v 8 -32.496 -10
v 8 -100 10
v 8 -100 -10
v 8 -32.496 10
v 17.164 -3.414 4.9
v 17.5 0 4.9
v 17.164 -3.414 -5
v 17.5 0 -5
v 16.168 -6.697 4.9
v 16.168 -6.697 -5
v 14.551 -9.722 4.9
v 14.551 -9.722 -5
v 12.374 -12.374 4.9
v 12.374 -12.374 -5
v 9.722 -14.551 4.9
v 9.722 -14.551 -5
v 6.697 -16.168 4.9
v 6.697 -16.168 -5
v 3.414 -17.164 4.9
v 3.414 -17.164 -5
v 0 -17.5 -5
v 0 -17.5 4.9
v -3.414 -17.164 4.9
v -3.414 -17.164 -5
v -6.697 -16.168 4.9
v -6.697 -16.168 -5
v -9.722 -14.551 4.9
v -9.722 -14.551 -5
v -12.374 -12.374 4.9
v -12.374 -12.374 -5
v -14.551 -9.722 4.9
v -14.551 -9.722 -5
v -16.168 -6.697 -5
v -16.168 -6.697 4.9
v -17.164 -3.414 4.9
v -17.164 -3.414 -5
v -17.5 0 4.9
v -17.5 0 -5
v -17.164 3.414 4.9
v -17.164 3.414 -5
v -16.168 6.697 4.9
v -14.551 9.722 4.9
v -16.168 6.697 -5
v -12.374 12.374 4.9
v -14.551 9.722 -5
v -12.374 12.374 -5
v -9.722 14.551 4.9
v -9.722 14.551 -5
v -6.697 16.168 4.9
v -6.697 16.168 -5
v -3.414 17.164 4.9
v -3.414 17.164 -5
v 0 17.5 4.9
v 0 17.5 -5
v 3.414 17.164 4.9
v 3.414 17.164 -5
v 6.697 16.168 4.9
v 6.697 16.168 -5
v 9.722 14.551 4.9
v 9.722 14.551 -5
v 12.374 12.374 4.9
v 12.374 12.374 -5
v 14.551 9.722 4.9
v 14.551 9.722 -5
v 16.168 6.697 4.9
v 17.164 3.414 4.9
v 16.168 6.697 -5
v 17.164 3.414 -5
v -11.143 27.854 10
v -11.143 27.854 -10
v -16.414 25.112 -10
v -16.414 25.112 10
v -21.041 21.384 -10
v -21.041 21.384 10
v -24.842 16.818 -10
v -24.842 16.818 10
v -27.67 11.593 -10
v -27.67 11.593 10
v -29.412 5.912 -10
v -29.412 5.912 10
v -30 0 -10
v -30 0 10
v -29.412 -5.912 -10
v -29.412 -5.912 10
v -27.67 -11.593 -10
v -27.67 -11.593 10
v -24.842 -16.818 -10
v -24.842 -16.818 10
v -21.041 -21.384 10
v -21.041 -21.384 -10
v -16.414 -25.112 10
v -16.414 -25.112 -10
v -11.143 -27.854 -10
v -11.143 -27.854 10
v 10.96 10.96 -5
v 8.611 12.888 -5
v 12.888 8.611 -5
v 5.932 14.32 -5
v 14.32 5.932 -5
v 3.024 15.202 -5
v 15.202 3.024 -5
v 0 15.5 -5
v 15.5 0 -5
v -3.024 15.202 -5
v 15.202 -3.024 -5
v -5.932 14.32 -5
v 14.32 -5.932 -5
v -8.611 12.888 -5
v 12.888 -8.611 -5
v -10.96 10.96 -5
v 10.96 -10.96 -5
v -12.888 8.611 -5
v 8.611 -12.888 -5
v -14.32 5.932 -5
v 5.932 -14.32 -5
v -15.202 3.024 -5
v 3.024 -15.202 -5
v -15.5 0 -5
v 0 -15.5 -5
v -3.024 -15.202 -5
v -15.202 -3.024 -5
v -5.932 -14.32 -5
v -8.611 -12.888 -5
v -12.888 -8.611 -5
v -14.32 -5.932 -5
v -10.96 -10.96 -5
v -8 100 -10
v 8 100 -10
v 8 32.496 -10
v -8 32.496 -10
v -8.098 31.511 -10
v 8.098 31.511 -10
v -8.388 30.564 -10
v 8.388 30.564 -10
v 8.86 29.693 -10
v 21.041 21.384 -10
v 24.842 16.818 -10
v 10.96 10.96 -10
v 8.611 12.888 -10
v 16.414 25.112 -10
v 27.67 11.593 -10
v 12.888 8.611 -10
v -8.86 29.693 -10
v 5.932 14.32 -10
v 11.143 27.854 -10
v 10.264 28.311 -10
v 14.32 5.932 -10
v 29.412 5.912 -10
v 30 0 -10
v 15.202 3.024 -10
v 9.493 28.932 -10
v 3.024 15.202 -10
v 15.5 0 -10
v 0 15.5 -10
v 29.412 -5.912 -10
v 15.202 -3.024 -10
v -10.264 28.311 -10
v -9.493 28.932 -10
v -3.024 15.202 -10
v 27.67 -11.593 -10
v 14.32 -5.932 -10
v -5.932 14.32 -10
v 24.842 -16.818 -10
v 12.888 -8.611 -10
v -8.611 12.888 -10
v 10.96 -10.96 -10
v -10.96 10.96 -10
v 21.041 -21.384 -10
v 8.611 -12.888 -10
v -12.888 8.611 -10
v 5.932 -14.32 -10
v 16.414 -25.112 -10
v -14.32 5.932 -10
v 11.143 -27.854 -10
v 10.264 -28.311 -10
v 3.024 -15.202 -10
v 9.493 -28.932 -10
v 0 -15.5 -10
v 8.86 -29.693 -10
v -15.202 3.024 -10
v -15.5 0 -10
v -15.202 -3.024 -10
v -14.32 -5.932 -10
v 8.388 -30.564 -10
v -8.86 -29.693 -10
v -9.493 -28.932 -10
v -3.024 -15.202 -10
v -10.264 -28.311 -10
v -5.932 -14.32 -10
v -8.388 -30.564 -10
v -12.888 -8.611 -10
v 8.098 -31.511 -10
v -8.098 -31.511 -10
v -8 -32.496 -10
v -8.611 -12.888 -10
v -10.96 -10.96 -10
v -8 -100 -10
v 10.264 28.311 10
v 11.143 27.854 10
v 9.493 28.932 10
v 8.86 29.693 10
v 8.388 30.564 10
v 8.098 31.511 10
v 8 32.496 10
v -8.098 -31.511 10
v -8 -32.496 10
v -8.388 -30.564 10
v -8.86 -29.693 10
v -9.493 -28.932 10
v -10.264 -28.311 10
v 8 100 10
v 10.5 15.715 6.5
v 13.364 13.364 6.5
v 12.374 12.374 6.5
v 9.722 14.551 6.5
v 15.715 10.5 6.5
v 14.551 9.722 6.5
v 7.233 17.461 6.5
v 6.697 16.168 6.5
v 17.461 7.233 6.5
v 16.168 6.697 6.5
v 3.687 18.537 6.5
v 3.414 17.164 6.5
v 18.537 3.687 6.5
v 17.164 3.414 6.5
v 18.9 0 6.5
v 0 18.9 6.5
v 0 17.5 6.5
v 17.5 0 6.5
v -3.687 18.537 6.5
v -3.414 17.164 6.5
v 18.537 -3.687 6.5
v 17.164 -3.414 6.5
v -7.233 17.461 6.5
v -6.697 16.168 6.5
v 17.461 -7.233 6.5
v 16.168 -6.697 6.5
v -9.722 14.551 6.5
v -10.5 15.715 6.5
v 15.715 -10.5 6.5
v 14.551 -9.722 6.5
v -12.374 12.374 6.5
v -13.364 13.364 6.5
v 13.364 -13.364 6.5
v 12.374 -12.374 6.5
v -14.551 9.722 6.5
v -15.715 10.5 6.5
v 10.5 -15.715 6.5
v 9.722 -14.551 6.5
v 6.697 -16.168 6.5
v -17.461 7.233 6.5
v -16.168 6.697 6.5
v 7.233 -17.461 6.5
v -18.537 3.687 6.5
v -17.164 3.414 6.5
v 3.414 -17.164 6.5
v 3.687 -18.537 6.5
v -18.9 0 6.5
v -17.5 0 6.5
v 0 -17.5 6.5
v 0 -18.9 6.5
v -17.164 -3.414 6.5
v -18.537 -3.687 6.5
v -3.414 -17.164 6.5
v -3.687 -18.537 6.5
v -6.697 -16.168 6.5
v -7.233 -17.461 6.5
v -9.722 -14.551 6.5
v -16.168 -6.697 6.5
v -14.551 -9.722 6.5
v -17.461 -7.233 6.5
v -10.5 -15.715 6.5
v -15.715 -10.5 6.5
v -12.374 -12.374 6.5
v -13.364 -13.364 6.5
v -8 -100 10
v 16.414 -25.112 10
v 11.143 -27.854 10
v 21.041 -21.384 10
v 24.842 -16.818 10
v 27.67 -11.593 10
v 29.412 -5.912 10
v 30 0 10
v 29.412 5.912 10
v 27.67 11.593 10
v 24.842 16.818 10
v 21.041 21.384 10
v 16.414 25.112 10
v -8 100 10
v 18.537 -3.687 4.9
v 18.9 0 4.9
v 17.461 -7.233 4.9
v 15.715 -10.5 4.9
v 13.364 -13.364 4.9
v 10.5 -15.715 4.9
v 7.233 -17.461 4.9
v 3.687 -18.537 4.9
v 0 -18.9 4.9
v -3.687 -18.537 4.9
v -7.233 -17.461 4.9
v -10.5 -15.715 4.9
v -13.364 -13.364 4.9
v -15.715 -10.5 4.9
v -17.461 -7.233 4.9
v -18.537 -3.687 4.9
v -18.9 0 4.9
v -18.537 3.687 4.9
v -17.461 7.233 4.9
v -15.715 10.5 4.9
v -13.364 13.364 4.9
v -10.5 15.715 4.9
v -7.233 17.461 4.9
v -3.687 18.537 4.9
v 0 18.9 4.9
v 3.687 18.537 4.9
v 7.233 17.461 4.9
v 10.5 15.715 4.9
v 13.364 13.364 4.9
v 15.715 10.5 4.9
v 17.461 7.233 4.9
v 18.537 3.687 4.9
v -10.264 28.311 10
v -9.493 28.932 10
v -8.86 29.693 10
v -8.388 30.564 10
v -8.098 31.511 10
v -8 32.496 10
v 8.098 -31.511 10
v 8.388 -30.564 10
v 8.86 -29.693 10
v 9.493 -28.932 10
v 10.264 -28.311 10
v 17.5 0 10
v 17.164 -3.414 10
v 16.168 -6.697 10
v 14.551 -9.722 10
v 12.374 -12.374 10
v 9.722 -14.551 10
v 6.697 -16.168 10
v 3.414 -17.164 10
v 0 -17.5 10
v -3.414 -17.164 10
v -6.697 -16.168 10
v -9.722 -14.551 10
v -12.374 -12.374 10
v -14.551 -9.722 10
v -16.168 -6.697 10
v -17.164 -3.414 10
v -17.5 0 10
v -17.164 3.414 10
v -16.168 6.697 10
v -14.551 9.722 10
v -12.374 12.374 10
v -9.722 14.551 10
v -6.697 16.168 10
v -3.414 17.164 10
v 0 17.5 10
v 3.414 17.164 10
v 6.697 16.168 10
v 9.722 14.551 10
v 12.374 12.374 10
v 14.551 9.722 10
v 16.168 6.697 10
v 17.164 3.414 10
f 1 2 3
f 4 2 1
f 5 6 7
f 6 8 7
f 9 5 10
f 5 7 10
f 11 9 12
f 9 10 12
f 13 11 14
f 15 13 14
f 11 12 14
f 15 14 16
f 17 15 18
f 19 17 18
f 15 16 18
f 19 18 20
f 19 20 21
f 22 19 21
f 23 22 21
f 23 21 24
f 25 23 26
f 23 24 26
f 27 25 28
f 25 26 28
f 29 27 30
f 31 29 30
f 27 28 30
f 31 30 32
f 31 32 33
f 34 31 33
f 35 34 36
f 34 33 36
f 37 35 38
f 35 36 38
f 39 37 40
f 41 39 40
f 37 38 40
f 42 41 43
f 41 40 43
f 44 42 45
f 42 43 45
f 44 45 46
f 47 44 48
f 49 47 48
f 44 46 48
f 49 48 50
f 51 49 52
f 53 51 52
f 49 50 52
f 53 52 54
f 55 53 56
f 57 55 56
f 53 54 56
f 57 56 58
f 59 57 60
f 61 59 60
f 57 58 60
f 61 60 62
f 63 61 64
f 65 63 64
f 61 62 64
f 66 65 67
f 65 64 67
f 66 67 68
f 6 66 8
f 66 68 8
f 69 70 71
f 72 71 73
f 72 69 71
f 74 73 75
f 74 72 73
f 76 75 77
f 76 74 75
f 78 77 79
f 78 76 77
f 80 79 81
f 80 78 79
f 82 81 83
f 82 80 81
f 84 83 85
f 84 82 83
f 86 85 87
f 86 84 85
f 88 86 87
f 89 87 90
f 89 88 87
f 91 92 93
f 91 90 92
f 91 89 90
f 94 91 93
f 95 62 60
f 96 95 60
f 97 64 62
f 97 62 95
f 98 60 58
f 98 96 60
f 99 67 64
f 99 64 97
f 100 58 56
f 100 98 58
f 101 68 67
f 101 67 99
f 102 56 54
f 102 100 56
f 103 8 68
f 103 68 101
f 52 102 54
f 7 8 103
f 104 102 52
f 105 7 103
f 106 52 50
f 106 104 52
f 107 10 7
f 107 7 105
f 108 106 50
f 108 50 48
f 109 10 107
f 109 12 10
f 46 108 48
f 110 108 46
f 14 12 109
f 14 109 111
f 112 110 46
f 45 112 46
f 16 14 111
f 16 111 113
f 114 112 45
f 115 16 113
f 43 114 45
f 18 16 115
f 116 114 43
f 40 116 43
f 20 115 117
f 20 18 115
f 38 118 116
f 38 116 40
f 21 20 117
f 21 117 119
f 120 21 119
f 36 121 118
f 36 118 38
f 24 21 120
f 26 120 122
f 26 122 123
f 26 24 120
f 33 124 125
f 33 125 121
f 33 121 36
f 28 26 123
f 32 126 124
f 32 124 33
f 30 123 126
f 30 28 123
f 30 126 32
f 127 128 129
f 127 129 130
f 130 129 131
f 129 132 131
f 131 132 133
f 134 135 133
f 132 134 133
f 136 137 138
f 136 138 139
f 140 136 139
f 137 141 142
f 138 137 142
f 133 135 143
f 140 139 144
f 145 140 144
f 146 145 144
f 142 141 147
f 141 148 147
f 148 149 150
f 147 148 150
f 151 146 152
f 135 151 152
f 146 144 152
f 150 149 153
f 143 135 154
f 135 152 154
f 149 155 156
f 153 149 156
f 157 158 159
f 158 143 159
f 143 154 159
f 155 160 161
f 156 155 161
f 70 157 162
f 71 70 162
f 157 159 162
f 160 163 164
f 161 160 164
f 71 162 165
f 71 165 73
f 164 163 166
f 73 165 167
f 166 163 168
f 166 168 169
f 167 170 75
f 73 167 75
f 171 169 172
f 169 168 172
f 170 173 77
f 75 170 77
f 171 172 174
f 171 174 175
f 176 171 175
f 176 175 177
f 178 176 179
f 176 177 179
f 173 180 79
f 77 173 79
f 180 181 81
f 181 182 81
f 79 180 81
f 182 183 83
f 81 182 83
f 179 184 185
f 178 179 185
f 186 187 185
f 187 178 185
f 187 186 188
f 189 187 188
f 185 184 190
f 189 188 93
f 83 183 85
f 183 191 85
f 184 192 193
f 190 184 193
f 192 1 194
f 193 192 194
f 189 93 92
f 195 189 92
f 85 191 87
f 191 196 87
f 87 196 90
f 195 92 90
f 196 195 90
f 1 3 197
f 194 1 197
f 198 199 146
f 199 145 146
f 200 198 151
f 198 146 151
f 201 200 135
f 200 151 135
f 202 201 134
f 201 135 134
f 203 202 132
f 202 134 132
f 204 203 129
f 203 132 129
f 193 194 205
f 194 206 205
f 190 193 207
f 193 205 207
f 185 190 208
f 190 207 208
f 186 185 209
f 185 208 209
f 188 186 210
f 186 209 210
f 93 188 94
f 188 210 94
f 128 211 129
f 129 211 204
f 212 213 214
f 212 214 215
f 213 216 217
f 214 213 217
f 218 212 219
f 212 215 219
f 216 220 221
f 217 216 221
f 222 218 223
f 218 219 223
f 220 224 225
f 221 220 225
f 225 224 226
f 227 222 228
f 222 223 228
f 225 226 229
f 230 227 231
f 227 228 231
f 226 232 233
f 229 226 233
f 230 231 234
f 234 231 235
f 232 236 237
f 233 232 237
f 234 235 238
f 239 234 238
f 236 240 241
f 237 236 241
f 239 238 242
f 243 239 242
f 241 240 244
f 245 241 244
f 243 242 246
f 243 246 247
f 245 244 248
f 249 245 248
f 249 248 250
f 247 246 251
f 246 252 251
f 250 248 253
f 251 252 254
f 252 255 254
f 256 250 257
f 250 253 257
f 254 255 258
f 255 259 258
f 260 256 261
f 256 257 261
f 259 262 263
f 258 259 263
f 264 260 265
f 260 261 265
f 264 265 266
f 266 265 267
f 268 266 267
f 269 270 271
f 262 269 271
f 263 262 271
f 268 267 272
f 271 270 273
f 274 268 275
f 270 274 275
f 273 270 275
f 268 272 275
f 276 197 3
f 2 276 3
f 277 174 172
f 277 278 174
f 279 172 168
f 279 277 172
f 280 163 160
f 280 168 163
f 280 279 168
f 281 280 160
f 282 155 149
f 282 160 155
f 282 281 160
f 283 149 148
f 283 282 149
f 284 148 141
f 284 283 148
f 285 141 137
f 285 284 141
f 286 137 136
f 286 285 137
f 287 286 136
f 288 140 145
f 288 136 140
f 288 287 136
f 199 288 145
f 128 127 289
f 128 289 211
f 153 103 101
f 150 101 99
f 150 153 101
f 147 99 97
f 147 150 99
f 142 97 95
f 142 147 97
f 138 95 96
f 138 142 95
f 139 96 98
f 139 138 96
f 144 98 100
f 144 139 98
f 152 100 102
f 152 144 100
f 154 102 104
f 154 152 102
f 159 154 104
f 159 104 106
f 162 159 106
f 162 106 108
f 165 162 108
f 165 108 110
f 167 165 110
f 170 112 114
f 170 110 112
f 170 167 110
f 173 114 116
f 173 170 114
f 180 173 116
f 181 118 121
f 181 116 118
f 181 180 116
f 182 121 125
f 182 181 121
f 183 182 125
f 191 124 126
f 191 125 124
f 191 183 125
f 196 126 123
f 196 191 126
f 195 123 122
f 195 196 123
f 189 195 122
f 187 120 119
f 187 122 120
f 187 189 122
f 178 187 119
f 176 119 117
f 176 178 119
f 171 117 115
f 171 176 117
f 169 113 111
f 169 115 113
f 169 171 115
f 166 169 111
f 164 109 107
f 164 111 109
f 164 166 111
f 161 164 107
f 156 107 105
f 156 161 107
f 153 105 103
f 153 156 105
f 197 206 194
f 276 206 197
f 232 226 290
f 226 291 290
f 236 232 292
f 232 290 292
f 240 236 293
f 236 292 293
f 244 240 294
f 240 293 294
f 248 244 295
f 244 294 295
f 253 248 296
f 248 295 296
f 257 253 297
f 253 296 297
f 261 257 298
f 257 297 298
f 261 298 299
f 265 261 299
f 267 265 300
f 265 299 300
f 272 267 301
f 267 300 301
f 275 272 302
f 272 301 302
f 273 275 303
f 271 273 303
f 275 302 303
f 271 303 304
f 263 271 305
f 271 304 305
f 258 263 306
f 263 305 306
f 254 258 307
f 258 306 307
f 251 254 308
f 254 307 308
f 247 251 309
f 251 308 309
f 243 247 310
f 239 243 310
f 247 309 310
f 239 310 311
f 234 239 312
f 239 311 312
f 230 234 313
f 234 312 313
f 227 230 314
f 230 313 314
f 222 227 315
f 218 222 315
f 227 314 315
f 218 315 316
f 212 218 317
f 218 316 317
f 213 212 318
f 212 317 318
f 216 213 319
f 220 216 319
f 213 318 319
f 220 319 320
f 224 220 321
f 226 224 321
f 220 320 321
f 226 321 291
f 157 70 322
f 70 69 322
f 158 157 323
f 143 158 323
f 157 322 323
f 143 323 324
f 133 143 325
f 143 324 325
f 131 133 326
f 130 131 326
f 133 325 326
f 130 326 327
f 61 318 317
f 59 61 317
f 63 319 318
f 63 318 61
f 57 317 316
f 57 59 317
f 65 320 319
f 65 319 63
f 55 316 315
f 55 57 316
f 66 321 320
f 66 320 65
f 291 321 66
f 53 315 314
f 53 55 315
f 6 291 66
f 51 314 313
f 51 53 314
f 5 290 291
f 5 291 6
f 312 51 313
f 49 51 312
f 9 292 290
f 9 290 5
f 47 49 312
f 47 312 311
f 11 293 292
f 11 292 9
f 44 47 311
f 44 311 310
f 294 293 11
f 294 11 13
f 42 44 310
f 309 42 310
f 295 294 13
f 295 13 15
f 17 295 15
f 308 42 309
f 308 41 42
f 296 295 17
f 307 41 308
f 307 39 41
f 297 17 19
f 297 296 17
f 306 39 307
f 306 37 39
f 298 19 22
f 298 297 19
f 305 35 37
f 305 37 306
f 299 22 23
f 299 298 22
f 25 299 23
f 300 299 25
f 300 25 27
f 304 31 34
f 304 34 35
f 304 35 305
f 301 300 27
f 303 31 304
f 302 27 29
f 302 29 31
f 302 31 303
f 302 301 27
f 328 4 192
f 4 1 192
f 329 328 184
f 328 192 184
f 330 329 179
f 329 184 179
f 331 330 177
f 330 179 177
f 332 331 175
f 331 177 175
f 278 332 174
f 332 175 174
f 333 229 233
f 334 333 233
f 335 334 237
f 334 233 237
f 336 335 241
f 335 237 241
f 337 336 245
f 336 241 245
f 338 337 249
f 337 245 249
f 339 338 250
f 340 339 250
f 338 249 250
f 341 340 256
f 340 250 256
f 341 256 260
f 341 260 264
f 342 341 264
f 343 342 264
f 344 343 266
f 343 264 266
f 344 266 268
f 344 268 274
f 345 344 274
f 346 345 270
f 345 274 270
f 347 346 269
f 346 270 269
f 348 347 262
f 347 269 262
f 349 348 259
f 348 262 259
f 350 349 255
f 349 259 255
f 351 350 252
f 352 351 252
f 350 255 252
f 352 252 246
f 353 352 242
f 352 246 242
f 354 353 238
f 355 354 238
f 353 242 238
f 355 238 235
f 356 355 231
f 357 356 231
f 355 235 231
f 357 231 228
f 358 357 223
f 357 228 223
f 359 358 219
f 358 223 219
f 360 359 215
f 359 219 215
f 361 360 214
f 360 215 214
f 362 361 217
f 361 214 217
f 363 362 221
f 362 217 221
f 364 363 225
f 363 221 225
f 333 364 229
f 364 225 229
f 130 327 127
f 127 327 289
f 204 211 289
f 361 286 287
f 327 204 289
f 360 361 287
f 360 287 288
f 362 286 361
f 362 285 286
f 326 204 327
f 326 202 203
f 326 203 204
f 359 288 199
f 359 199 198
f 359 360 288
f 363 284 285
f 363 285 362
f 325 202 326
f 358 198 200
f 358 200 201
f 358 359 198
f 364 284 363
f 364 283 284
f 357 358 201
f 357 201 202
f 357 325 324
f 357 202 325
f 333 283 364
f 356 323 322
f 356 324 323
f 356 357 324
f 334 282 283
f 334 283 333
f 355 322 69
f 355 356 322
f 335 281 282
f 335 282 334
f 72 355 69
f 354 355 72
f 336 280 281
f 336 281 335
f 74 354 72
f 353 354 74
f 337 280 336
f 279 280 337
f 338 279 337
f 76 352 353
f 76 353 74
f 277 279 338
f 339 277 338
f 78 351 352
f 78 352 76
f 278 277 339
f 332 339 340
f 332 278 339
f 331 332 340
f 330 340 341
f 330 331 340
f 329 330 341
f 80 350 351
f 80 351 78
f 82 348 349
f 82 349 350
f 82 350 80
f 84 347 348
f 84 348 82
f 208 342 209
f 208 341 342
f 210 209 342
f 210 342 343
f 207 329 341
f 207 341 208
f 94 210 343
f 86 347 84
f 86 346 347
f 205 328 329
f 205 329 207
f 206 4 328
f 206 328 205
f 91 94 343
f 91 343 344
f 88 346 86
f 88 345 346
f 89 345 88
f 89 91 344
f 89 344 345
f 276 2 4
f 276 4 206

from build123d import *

# Parameters (mm, degrees)
SKETCH1_R           = 30
SKETCH1_R_2         = 15.5
BOSS_EXTRUDE1_DEPTH = 10
BOSS_EXTRUDE2_DEPTH = 10
SKETCH3_W           = 15
SKETCH3_H           = 2
SKETCH4_W           = 1.6
SKETCH4_H           = 1.9
FILLET1_R           = 5


with BuildPart() as part:
    # Sketch1 → Boss-Extrude1 (new, symmetric)
    with BuildSketch(Plane.XY):
        Circle(SKETCH1_R)
        Circle(SKETCH1_R_2, mode=Mode.SUBTRACT)
    extrude(amount=BOSS_EXTRUDE1_DEPTH, both=True)

    # Sketch2 → Boss-Extrude2 (add, symmetric)
    with BuildSketch(Plane.XY):
        Polygon((-8, 100), (8, 100), (8, 28.91366459), (0, 30), (-8, 28.91366459), align=None)
    boss_extrude2 = extrude(amount=BOSS_EXTRUDE2_DEPTH, both=True)

    # Mirror1: Boss-Extrude2 across plane
    add(boss_extrude2.mirror(Plane.ZX))

    # Sketch3 → Cut-Revolve1 (revolve, cut)
    with BuildSketch(Plane(origin=(0, 0, 0), x_dir=(0, 0, -1), z_dir=(1, 0, 0)), mode=Mode.PRIVATE) as cut_revolve1_sk:
        with Locations((-2.5, 16.5)):
            Rectangle(SKETCH3_W, SKETCH3_H)
    revolve(cut_revolve1_sk.sketch.rotate(Axis((0, 0, 0), (0, 0, -1)), 90), axis=Axis((0, 0, 0), (0, 0, -1)), mode=Mode.SUBTRACT)

    # Sketch4 → Cut-Revolve2 (revolve, cut)
    with BuildSketch(Plane(origin=(0, 0, 0), x_dir=(0, 0, -1), z_dir=(1, 0, 0)), mode=Mode.PRIVATE) as cut_revolve2_sk:
        with Locations((-5.7, 17.95)):
            Rectangle(SKETCH4_W, SKETCH4_H)
    revolve(cut_revolve2_sk.sketch.rotate(Axis((0, 0, 0), (0, 0, -1)), 90), axis=Axis((0, 0, 0), (0, 0, -1)), mode=Mode.SUBTRACT)

    # Fillet1
    fillet1_edges = [part.edges().sort_by_distance(p)[0] for p in [
        (8, 28.91366459, 0),
        (-8, 28.91366459, 0),
        (8, -28.91366459, 0),
        (-8, -28.91366459, 0),
    ]]
    fillet(fillet1_edges, radius=FILLET1_R)


solid = part.part
